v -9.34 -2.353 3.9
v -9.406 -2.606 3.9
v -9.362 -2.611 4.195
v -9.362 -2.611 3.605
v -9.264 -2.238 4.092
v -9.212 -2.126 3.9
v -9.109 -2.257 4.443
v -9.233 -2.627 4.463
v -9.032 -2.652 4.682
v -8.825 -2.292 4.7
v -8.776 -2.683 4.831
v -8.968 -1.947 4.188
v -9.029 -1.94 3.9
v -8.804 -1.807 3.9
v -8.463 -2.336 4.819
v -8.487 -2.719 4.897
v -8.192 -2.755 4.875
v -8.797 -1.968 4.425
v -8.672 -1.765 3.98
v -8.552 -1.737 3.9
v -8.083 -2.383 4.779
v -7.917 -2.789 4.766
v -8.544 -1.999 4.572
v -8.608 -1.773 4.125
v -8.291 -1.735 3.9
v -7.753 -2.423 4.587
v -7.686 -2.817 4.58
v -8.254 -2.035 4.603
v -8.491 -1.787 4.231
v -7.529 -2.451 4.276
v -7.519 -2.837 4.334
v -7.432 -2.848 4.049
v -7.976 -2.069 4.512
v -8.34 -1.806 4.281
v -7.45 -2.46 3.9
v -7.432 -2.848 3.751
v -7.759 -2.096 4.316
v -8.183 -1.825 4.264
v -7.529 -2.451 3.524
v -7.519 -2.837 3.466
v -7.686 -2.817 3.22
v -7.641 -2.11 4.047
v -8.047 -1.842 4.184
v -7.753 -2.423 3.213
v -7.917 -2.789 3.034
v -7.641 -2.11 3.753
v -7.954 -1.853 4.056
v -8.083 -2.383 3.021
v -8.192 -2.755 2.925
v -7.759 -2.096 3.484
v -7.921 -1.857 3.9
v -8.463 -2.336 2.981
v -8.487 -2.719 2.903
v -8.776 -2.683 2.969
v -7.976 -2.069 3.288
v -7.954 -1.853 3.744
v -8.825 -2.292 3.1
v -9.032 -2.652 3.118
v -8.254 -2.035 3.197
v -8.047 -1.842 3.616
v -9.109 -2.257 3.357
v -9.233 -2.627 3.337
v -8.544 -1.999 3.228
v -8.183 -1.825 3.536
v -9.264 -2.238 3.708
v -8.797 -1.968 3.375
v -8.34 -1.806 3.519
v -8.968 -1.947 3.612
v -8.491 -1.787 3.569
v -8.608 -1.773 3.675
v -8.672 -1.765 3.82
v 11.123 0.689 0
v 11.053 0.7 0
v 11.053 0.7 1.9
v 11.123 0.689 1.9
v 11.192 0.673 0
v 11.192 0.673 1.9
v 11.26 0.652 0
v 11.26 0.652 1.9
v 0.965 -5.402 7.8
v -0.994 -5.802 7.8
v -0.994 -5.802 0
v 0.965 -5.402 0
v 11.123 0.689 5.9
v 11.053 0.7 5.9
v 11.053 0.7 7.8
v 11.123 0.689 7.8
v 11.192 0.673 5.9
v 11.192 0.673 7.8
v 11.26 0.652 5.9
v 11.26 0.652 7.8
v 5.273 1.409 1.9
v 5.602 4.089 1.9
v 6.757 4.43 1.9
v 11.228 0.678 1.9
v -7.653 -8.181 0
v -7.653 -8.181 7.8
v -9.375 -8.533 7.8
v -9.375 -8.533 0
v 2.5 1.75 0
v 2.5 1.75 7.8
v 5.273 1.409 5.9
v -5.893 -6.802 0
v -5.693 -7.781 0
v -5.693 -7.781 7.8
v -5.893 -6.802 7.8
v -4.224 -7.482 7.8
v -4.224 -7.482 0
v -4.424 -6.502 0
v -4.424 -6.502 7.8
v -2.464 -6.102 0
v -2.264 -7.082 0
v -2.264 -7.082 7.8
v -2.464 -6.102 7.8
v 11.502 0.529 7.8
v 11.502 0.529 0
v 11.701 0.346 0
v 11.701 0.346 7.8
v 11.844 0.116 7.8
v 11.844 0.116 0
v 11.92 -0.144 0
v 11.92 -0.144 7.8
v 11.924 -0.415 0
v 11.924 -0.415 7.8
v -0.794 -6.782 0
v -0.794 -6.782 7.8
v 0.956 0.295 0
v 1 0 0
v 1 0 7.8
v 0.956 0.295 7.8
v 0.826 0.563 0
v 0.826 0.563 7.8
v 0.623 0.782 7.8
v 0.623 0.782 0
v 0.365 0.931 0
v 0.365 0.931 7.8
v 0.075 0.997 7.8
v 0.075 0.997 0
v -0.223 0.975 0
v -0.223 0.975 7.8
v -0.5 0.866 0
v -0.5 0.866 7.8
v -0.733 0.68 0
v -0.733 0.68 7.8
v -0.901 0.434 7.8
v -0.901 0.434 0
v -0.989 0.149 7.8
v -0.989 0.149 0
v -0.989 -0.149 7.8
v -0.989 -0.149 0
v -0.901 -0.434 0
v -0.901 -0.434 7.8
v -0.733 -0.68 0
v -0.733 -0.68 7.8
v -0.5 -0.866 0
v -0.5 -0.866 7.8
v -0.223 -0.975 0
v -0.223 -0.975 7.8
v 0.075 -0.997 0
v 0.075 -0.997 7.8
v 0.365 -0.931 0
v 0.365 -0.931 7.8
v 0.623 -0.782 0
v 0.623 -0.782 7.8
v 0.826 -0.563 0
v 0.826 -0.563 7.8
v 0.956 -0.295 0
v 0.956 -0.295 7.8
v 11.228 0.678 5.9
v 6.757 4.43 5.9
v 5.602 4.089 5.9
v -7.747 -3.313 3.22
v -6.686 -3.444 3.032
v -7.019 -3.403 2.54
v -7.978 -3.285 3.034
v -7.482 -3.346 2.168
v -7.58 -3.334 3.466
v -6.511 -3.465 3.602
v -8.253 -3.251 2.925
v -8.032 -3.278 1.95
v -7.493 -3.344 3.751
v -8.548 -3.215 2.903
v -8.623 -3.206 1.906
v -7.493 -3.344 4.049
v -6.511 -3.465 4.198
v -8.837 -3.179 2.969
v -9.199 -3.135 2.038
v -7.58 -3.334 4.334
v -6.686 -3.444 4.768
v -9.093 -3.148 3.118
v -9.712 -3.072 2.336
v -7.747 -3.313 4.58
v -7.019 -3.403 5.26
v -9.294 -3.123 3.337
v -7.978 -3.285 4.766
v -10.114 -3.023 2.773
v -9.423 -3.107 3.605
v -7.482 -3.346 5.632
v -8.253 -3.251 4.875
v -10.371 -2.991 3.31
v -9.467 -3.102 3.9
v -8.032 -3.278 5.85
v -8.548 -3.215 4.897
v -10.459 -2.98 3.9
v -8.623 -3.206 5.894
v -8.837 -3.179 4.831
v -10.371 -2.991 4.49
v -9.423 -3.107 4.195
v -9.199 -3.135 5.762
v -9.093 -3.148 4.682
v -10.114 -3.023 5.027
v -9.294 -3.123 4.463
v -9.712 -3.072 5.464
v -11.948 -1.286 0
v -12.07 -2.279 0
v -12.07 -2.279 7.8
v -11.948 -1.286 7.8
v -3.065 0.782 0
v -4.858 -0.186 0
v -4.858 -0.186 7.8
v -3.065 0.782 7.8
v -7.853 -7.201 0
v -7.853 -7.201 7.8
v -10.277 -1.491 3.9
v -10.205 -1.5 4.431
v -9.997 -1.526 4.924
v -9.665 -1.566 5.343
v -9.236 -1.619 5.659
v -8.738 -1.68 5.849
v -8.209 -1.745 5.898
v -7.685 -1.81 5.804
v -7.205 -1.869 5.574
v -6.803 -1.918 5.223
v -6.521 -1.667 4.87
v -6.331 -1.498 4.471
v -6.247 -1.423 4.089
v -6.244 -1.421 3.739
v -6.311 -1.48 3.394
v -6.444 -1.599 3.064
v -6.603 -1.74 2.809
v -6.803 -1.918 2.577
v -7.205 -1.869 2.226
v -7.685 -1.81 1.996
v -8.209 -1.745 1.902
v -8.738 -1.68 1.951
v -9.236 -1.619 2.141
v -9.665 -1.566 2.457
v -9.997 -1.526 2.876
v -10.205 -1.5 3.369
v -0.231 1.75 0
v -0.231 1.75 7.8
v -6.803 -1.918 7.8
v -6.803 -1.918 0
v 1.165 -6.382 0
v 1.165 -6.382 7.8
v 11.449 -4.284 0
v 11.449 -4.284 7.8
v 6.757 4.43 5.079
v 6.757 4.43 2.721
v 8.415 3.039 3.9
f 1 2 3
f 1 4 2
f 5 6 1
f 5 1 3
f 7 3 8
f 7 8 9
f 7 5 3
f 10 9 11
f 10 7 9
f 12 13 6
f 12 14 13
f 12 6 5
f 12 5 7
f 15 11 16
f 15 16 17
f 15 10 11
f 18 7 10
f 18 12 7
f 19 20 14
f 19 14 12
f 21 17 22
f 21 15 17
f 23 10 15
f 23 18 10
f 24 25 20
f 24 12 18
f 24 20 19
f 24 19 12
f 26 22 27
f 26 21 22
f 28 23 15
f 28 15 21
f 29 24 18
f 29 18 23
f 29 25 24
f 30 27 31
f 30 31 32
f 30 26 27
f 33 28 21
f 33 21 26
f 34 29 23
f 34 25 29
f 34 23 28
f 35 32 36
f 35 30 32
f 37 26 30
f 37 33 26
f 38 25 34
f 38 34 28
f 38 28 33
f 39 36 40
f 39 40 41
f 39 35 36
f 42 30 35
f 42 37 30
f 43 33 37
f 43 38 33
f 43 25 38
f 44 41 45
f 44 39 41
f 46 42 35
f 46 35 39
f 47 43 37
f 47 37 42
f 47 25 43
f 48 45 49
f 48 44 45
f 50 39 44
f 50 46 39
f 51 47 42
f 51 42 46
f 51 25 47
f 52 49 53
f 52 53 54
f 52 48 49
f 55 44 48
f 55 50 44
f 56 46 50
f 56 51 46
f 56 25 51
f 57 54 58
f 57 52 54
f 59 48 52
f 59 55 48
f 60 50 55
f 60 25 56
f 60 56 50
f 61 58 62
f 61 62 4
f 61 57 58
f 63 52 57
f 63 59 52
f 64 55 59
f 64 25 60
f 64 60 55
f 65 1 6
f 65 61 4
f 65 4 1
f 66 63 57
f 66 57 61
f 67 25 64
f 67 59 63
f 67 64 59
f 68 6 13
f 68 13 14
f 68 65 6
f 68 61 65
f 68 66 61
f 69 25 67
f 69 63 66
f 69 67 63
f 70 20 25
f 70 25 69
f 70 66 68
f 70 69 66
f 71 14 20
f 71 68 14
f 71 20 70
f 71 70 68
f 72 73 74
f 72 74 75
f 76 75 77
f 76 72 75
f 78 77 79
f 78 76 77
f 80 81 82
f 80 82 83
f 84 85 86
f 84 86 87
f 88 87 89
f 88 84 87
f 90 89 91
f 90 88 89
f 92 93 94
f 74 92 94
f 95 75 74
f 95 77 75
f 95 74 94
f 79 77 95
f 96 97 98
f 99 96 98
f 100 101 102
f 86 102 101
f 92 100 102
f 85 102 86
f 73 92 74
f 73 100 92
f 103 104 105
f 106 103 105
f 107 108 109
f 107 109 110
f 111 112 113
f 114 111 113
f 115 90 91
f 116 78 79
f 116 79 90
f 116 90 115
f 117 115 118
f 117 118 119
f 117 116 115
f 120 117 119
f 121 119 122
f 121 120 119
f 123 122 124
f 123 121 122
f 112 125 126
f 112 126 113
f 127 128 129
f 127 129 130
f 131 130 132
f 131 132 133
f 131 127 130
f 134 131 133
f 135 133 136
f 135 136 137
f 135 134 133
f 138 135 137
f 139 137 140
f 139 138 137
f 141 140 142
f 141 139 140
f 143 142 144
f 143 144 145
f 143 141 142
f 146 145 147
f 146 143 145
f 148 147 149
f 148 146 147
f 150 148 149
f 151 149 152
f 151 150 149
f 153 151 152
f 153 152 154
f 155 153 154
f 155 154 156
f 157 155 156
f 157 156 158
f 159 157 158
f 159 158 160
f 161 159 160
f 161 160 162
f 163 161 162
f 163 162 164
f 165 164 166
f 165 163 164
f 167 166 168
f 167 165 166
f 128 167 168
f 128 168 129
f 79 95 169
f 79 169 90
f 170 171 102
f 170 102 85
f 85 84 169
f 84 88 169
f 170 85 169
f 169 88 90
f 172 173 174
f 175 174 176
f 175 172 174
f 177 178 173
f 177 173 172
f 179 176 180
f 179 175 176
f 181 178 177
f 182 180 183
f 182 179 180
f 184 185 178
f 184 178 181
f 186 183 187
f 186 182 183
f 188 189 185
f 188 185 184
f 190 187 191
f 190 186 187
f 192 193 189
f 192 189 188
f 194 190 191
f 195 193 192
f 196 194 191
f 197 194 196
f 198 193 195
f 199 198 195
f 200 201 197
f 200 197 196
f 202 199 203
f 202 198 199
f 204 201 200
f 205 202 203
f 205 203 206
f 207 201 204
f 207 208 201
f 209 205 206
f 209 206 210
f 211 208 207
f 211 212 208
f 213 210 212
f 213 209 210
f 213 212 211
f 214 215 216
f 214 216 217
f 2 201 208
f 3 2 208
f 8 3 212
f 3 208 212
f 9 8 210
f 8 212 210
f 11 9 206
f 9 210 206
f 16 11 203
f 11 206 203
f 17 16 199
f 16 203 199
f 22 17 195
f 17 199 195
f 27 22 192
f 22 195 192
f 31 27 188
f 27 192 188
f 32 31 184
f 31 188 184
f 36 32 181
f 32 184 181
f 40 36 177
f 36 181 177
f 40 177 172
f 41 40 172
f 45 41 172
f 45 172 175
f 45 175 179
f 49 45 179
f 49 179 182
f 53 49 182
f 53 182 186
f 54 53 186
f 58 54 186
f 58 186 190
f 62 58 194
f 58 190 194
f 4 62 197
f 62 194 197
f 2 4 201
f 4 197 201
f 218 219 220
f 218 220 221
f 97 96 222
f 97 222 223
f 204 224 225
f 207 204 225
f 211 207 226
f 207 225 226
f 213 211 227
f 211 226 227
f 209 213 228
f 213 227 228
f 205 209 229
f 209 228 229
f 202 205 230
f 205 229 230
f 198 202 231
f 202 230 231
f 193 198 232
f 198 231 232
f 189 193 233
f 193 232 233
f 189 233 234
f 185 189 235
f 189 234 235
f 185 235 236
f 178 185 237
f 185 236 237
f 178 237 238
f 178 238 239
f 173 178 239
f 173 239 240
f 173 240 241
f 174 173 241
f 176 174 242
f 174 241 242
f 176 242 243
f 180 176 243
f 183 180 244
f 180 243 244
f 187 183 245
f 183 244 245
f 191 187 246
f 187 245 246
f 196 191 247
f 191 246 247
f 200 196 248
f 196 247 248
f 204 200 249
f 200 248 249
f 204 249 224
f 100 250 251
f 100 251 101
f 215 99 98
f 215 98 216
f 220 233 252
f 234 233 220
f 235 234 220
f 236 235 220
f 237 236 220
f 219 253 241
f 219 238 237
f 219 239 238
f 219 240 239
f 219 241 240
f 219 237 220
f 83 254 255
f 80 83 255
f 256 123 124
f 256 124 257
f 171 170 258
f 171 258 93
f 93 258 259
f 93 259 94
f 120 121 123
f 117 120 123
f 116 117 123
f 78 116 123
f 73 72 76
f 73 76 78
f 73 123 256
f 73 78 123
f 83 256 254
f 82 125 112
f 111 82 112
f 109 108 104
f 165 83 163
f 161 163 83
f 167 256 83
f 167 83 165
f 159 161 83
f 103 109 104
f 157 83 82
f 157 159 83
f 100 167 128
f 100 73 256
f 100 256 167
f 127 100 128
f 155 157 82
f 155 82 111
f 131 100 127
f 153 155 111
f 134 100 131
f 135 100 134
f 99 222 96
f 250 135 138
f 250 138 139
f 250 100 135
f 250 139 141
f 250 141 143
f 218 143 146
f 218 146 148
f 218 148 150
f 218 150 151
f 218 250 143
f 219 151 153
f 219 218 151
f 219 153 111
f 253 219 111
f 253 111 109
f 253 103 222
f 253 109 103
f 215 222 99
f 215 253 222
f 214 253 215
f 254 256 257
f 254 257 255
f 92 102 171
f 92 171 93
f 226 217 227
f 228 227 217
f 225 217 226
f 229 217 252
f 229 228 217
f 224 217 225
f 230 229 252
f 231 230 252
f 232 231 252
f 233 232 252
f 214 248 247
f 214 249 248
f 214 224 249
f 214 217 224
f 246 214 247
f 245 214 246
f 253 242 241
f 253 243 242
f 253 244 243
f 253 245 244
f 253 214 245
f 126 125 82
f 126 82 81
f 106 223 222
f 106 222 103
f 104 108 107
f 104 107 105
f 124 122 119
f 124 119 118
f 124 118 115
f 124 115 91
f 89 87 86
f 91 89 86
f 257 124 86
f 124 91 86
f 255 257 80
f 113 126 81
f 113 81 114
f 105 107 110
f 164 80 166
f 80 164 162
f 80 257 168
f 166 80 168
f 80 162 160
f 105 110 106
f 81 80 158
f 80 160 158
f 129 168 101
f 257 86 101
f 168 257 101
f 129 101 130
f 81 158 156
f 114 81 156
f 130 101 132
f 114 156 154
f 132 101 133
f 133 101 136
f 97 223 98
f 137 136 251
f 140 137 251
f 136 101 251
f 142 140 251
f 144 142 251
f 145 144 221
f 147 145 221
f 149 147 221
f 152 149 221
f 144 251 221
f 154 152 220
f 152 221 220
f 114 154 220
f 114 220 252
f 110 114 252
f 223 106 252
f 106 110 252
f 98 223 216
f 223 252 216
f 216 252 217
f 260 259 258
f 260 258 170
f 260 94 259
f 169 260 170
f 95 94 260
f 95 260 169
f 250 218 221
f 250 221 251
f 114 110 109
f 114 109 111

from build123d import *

# Parameters (mm, degrees)
SKETCH_2_R          = 1
EXTRUDE_2_DEPTH     = 7.8
SKETCH_3_W          = 6
SKETCH_3_H          = 4
EXTRUDE_3_DEPTH     = 4
CHAMFER_1_SIZE      = 1.3
CHAMFER_1_SIZE2     = 3
CHAMFER_2_SIZE      = 6.159459855
CHAMFER_2_SIZE_2    = 4
SKETCH_4_R          = 2
CUT_EXTRUDE_1_DEPTH = 1.5
SKETCH_5_R          = 1
EXTRUDE_4_DEPTH     = 1.5
FILLET_1_R          = 1
SKETCH_6_W          = 2
SKETCH_6_H          = 7.8
CUT_EXTRUDE_2_DEPTH = 1
FILLET_START        = -1
FILLET_2_DEPTH      = 10
FILLET_2_2_DEPTH    = 2.9
FILLET_START_2      = 5.9
FILLET_2_3_DEPTH    = 3.1


with BuildPart() as part:
    # 스케치2 → 보스-돌출2 (new body)
    with BuildSketch(Plane.XY):
        Polygon((2.5, 1.75), (12.045629808, 0.577944035), (11.448632524, -4.284208661), (-9.375446541, -8.532579884), (-12.070254037, -2.279394966), (-11.94829225, -1.286095926), (-6.802600831, -1.917907388), (-4.857687993, -0.185790939), (-3.065051347, 0.78210453), (-0.230903775, 1.75), align=None)
        Circle(SKETCH_2_R, mode=Mode.SUBTRACT)
    extrude(amount=EXTRUDE_2_DEPTH)

    # 스케치3 → 보스-돌출3 (add)
    with BuildSketch(Plane(origin=(0.248812001, 2.02641113, 0), x_dir=(0.9925461516413224, -0.12186934340514406, 0), z_dir=(0.12186934340514406, 0.9925461516413224, 0))):
        with Locations((8.062111671, -3.9)):
            Rectangle(SKETCH_3_W, SKETCH_3_H)
    extrude(amount=EXTRUDE_3_DEPTH)

    # 모따기1
    chamfer_1_edges = [part.edges().sort_by_distance(p)[0] for p in [
        (5.760668833, 5.379679511, 3.9),
    ]]
    chamfer_1_side = [part.faces().sort_by_distance(p)[0] for p in [
        (5.516930146, 3.394587208, 3.9),
    ]]
    chamfer(chamfer_1_edges, length=CHAMFER_1_SIZE, length2=CHAMFER_1_SIZE2, reference=chamfer_1_side[0])

    # 모따기2
    # the kernel refuses this chamfer: 6.159459855, 4 mm, written as the material it takes off along each edge
    with BuildSketch(Plane(origin=(9.288459468, -15.121825718, 5.9), x_dir=(-0.9925461516413224, 0.12186934340514405, 0), z_dir=(0.12186934340514406, 0.9925461516413224, 0))) as chamfer_2_piece_1_section:
        Polygon((CHAMFER_2_SIZE, 0), (0, -CHAMFER_2_SIZE_2), (0, 0), align=None)
    chamfer_2_piece_1 = extrude(amount=35.837521179, mode=Mode.PRIVATE)
    chamfer_2_piece_1 = split(chamfer_2_piece_1, bisect_by=Plane(origin=(17.870057149, -4.894675852, 5.9), z_dir=(0.6427876096865351, 0.7660444431189816, 0)), keep=Keep.TOP, mode=Mode.PRIVATE)
    add(chamfer_2_piece_1, mode=Mode.SUBTRACT)
    with BuildSketch(Plane(origin=(9.288459468, -15.121825718, 1.9), x_dir=(-0.9925461516413225, 0.12186934340514408, 0), z_dir=(0.12186934340514406, 0.9925461516413224, 0))) as chamfer_2_piece_2_section:
        Polygon((CHAMFER_2_SIZE, 0), (0, CHAMFER_2_SIZE_2), (0, 0), align=None)
    chamfer_2_piece_2 = extrude(amount=35.837521179, mode=Mode.PRIVATE)
    chamfer_2_piece_2 = split(chamfer_2_piece_2, bisect_by=Plane(origin=(17.870057149, -4.894675852, 1.9), z_dir=(0.6427876096865351, 0.7660444431189816, 0)), keep=Keep.TOP, mode=Mode.PRIVATE)
    add(chamfer_2_piece_2, mode=Mode.SUBTRACT)
    with BuildSketch(Plane(origin=(11.715945743, 4.648463451, -14.01876059), x_dir=(-0.9925461516413225, 0.1218693434051441, 0), z_dir=(0, 0, 1))) as chamfer_2_piece_3:
        Polygon((CHAMFER_2_SIZE, 0), (0, CHAMFER_2_SIZE_2), (0, 0), align=None)
    extrude(amount=35.837521179, mode=Mode.SUBTRACT)

    # 스케치4 → 컷-돌출1 (cut, symmetric)
    with BuildSketch(Plane(origin=(-0.333025054, -2.712271409, 0), x_dir=(0.9925461516413224, -0.12186934340514398, 0), z_dir=(0.12186934340514398, 0.9925461516413224, 0))):
        with Locations(Location((-8.018161162, -3.9, 0), (0, 0, 180))):
            Circle(SKETCH_4_R)
    extrude(amount=CUT_EXTRUDE_1_DEPTH, both=True, mode=Mode.SUBTRACT)

    # 스케치5 → 보스-돌출4 (add)
    with BuildSketch(Plane(origin=(-0.515829069, -4.201090636, 0), x_dir=(0.9925461516413224, -0.12186934340514398, 0), z_dir=(0.12186934340514398, 0.9925461516413224, 0))):
        with Locations(Location((-8.018161162, -3.9, 0), (0, 0, 180))):
            Circle(SKETCH_5_R)
    extrude(amount=EXTRUDE_4_DEPTH)

    # 필렛1
    fillet_1_edges = [part.edges().sort_by_distance(p)[0] for p in [
        (-7.298873907, -1.856972716, 3.9),
    ]]
    fillet(fillet_1_edges, radius=FILLET_1_R)

    # 스케치6 → 컷-돌출2 (cut)
    with BuildSketch(Plane(origin=(1.296571576, -6.355355406, 0), x_dir=(0.9798173389697206, 0.19989492803544545, 0), z_dir=(0.19989492803544545, -0.9798173389697206, 0))):
        with Locations((-8.133925678, 3.9)):
            Rectangle(SKETCH_6_W, SKETCH_6_H)
        with Locations((-4.633925678, 3.9)):
            Rectangle(SKETCH_6_W, SKETCH_6_H)
        with Locations((-1.133925678, 3.9)):
            Rectangle(SKETCH_6_W, SKETCH_6_H)
    extrude(amount=-CUT_EXTRUDE_2_DEPTH, mode=Mode.SUBTRACT)

    # 필렛2: read off the stored shape, not the designer's step
    # 필렛2 outline → 필렛2 (cut)
    with BuildSketch(Plane.XY.offset(FILLET_START)):
        with BuildLine():
            Line((11.228468369, 0.678278844), (11.260303349, 0.651566124))
            ThreePointArc((11.260303349, 0.651566124), (11.780248218, 0.235605593), (11.923760465, -0.414602116))
            Line((11.923760465, -0.414602116), (12.045629808, 0.577944035))
            Line((12.045629808, 0.577944035), (11.228468369, 0.678278844))
        make_face()
    extrude(amount=FILLET_2_DEPTH, mode=Mode.SUBTRACT)

    # Fillet 2 2 outline → Fillet 2 2 (cut)
    with BuildSketch(Plane.XY.offset(FILLET_START)):
        with BuildLine():
            Line((11.228468369, 0.678278844), (11.053083657, 0.699813379))
            ThreePointArc((11.053083657, 0.699813379), (11.157980304, 0.6812165), (11.260303349, 0.651566124))
            Line((11.260303349, 0.651566124), (11.228468369, 0.678278844))
        make_face()
    extrude(amount=FILLET_2_2_DEPTH, mode=Mode.SUBTRACT)

    # Fillet 2 3 outline → Fillet 2 3 (cut)
    with BuildSketch(Plane.XY.offset(FILLET_START_2)):
        with BuildLine():
            Line((11.228468369, 0.678278844), (11.053083657, 0.699813379))
            ThreePointArc((11.053083657, 0.699813379), (11.157980304, 0.6812165), (11.260303349, 0.651566124))
            Line((11.260303349, 0.651566124), (11.228468369, 0.678278844))
        make_face()
    extrude(amount=FILLET_2_3_DEPTH, mode=Mode.SUBTRACT)


solid = part.part
